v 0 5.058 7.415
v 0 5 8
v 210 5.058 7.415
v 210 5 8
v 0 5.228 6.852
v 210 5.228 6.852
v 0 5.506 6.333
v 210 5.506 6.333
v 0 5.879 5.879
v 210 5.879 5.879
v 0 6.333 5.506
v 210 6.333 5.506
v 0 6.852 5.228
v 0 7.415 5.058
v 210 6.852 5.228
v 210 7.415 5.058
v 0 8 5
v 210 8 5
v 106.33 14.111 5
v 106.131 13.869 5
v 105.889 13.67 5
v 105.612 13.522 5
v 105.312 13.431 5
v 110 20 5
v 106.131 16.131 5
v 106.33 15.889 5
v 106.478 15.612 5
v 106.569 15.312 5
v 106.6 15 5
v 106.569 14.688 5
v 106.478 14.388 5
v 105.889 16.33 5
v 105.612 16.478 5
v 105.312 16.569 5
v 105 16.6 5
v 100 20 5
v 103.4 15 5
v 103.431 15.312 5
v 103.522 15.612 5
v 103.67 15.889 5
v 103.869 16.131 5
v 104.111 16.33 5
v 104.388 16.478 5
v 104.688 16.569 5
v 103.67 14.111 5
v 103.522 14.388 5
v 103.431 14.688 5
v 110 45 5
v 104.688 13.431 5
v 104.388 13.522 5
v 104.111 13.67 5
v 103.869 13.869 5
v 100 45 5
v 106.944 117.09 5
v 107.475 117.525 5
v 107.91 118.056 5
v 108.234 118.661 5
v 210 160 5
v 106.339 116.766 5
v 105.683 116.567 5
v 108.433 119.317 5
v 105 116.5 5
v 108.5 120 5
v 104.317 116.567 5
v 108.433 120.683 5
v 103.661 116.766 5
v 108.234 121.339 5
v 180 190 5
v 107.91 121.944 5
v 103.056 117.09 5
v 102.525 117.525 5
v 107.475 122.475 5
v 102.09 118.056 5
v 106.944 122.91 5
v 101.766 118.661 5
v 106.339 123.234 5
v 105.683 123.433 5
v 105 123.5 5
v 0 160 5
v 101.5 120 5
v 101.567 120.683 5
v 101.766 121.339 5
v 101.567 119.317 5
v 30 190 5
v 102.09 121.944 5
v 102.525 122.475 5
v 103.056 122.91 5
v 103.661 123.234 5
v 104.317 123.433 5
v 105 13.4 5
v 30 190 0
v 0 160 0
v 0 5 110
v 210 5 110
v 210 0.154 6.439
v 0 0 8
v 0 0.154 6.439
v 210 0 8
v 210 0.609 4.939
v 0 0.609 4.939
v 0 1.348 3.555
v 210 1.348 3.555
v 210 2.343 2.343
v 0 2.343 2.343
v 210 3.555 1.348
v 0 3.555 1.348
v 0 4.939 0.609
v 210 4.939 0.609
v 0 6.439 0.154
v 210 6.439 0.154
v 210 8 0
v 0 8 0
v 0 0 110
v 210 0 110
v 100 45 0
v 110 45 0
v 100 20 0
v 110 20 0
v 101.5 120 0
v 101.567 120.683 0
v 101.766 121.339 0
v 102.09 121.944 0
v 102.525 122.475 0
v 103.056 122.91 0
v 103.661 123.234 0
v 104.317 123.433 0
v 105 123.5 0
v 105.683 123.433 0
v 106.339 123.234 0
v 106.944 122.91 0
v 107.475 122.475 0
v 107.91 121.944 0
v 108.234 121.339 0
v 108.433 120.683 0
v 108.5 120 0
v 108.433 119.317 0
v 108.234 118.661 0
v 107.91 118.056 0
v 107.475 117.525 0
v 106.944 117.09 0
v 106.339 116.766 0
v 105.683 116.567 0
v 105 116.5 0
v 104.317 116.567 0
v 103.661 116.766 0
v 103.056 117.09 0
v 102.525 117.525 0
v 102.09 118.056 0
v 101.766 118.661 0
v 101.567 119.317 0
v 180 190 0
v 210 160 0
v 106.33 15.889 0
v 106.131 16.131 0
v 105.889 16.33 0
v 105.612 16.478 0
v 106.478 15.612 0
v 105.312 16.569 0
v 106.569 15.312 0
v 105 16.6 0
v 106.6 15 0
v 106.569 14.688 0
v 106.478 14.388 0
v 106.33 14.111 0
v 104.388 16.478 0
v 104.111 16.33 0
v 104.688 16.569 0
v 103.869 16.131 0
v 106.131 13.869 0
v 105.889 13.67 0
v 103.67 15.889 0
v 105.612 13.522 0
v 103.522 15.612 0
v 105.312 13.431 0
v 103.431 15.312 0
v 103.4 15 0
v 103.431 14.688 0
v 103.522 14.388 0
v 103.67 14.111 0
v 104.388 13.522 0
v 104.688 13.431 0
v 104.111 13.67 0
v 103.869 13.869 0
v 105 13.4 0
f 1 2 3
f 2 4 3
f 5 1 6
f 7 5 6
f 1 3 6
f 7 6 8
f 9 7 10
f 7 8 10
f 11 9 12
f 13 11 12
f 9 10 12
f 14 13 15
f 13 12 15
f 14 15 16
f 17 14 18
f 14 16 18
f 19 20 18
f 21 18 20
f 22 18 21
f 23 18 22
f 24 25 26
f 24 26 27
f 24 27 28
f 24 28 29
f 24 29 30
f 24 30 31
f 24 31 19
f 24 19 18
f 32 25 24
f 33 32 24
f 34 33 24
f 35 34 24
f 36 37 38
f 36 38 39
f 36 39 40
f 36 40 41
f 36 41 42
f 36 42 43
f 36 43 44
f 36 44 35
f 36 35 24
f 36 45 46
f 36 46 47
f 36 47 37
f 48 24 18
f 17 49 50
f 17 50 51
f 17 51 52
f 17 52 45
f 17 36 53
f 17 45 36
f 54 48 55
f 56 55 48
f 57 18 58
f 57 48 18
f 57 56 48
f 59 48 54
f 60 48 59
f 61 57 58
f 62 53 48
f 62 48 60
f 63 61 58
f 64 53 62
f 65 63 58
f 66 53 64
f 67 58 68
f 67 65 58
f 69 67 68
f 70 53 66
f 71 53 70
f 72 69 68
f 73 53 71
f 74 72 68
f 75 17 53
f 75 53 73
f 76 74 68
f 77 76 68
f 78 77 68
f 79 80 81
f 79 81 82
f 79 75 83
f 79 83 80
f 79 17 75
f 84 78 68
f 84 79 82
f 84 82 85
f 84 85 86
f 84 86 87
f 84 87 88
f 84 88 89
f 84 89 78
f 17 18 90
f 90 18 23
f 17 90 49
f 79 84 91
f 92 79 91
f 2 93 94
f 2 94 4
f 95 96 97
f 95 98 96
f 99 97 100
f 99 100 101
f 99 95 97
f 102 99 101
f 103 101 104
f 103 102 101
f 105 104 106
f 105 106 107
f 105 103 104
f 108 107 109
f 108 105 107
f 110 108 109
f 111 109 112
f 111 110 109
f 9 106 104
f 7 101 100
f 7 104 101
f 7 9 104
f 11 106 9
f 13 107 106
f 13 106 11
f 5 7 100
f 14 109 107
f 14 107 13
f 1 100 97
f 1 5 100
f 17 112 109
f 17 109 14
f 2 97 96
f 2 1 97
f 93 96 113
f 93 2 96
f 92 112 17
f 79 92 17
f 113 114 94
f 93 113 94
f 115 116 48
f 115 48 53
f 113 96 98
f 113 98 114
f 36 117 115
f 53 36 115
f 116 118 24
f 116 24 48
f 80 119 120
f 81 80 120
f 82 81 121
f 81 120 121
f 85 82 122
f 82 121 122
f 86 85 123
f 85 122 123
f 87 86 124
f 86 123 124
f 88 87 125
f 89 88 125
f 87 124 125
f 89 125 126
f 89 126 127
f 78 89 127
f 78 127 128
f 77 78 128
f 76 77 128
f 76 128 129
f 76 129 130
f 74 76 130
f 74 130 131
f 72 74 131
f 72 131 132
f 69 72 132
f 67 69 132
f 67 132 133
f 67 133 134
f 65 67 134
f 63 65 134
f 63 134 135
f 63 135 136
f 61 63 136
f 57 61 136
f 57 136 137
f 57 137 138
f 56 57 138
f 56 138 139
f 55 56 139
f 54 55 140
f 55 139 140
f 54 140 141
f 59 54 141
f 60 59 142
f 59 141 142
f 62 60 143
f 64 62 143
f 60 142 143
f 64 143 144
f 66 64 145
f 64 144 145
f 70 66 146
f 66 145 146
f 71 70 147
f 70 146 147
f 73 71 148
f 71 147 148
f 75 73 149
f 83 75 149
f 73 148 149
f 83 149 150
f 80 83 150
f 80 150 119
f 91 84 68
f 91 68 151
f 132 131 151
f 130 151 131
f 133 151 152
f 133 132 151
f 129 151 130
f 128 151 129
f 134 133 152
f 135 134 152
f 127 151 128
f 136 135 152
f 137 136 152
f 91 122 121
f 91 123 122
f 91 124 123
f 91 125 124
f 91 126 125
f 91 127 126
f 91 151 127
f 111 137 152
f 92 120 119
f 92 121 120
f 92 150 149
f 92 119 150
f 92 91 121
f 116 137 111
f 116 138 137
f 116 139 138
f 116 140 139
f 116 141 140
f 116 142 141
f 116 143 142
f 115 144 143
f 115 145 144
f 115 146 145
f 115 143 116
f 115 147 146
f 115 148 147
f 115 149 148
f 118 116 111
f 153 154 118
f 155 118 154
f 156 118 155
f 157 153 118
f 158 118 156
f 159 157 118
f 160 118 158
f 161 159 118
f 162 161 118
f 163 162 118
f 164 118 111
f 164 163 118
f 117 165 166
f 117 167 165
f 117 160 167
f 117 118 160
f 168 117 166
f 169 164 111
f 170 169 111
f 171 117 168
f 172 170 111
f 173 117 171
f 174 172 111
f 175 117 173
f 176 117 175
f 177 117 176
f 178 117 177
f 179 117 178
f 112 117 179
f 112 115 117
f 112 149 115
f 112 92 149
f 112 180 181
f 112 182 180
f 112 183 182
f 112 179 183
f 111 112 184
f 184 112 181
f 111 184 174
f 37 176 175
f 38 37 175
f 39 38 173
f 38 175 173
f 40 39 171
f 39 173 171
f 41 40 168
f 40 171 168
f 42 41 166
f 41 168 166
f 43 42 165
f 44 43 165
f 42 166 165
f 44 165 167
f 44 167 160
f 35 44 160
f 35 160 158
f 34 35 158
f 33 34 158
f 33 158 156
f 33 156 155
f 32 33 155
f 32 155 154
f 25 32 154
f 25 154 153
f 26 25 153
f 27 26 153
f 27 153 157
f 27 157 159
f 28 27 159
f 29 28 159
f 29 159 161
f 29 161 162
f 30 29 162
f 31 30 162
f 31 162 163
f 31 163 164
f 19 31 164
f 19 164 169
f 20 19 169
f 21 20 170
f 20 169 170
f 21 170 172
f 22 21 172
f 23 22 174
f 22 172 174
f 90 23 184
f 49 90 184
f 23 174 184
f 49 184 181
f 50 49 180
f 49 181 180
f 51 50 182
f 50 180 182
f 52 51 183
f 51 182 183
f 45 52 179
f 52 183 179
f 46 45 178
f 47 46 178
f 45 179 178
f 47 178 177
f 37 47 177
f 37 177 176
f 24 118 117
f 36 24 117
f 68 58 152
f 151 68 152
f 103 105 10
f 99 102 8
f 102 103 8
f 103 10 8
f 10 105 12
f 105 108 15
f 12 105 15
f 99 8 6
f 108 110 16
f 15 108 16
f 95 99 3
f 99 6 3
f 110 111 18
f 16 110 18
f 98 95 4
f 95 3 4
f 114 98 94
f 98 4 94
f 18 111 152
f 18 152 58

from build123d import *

# Parameters (mm, degrees)
BOSS_EXTRUDE1_DEPTH = 210
FILLET1_R           = 3
FILLET2_R           = 8
SKETCH2_R           = 3.5
SKETCH2_R_2         = 1.6
SKETCH2_W           = 10
SKETCH2_H           = 25
CUT_EXTRUDE1_DEPTH  = 111
CHAMFER1_SIZE       = 30


with BuildPart() as part:
    # Sketch1 → Boss-Extrude1 (new body)
    with BuildSketch(Plane(origin=(0, 0, 0), x_dir=(0, 0, -1), z_dir=(1, 0, 0))):
        Polygon((0, 190), (0, 0), (-110, 0), (-110, 5), (-5, 5), (-5, 190), align=None)
    extrude(amount=BOSS_EXTRUDE1_DEPTH)

    # Fillet1
    fillet1_edges = [part.edges().sort_by_distance(p)[0] for p in [
        (105, 5, 5),
    ]]
    fillet(fillet1_edges, radius=FILLET1_R)

    # Fillet2
    fillet2_edges = [part.edges().sort_by_distance(p)[0] for p in [
        (105, 0, 0),
    ]]
    fillet(fillet2_edges, radius=FILLET2_R)

    # Sketch2 → Cut-Extrude1 (cut, through all)
    with BuildSketch(Plane(origin=(0, 0, 0), x_dir=(-1, 0, 0), z_dir=(0, 0, -1))):
        with Locations((-105, 120)):
            Circle(SKETCH2_R)
        with Locations((-105, 15)):
            Circle(SKETCH2_R_2)
        with Locations((-105, 32.5)):
            Rectangle(SKETCH2_W, SKETCH2_H)
    extrude(amount=-CUT_EXTRUDE1_DEPTH, mode=Mode.SUBTRACT)

    # Chamfer1
    chamfer1_edges = [part.edges().sort_by_distance(p)[0] for p in [
        (210, 190, 2.5),
        (0, 190, 2.5),
    ]]
    chamfer(chamfer1_edges, length=CHAMFER1_SIZE)


solid = part.part
